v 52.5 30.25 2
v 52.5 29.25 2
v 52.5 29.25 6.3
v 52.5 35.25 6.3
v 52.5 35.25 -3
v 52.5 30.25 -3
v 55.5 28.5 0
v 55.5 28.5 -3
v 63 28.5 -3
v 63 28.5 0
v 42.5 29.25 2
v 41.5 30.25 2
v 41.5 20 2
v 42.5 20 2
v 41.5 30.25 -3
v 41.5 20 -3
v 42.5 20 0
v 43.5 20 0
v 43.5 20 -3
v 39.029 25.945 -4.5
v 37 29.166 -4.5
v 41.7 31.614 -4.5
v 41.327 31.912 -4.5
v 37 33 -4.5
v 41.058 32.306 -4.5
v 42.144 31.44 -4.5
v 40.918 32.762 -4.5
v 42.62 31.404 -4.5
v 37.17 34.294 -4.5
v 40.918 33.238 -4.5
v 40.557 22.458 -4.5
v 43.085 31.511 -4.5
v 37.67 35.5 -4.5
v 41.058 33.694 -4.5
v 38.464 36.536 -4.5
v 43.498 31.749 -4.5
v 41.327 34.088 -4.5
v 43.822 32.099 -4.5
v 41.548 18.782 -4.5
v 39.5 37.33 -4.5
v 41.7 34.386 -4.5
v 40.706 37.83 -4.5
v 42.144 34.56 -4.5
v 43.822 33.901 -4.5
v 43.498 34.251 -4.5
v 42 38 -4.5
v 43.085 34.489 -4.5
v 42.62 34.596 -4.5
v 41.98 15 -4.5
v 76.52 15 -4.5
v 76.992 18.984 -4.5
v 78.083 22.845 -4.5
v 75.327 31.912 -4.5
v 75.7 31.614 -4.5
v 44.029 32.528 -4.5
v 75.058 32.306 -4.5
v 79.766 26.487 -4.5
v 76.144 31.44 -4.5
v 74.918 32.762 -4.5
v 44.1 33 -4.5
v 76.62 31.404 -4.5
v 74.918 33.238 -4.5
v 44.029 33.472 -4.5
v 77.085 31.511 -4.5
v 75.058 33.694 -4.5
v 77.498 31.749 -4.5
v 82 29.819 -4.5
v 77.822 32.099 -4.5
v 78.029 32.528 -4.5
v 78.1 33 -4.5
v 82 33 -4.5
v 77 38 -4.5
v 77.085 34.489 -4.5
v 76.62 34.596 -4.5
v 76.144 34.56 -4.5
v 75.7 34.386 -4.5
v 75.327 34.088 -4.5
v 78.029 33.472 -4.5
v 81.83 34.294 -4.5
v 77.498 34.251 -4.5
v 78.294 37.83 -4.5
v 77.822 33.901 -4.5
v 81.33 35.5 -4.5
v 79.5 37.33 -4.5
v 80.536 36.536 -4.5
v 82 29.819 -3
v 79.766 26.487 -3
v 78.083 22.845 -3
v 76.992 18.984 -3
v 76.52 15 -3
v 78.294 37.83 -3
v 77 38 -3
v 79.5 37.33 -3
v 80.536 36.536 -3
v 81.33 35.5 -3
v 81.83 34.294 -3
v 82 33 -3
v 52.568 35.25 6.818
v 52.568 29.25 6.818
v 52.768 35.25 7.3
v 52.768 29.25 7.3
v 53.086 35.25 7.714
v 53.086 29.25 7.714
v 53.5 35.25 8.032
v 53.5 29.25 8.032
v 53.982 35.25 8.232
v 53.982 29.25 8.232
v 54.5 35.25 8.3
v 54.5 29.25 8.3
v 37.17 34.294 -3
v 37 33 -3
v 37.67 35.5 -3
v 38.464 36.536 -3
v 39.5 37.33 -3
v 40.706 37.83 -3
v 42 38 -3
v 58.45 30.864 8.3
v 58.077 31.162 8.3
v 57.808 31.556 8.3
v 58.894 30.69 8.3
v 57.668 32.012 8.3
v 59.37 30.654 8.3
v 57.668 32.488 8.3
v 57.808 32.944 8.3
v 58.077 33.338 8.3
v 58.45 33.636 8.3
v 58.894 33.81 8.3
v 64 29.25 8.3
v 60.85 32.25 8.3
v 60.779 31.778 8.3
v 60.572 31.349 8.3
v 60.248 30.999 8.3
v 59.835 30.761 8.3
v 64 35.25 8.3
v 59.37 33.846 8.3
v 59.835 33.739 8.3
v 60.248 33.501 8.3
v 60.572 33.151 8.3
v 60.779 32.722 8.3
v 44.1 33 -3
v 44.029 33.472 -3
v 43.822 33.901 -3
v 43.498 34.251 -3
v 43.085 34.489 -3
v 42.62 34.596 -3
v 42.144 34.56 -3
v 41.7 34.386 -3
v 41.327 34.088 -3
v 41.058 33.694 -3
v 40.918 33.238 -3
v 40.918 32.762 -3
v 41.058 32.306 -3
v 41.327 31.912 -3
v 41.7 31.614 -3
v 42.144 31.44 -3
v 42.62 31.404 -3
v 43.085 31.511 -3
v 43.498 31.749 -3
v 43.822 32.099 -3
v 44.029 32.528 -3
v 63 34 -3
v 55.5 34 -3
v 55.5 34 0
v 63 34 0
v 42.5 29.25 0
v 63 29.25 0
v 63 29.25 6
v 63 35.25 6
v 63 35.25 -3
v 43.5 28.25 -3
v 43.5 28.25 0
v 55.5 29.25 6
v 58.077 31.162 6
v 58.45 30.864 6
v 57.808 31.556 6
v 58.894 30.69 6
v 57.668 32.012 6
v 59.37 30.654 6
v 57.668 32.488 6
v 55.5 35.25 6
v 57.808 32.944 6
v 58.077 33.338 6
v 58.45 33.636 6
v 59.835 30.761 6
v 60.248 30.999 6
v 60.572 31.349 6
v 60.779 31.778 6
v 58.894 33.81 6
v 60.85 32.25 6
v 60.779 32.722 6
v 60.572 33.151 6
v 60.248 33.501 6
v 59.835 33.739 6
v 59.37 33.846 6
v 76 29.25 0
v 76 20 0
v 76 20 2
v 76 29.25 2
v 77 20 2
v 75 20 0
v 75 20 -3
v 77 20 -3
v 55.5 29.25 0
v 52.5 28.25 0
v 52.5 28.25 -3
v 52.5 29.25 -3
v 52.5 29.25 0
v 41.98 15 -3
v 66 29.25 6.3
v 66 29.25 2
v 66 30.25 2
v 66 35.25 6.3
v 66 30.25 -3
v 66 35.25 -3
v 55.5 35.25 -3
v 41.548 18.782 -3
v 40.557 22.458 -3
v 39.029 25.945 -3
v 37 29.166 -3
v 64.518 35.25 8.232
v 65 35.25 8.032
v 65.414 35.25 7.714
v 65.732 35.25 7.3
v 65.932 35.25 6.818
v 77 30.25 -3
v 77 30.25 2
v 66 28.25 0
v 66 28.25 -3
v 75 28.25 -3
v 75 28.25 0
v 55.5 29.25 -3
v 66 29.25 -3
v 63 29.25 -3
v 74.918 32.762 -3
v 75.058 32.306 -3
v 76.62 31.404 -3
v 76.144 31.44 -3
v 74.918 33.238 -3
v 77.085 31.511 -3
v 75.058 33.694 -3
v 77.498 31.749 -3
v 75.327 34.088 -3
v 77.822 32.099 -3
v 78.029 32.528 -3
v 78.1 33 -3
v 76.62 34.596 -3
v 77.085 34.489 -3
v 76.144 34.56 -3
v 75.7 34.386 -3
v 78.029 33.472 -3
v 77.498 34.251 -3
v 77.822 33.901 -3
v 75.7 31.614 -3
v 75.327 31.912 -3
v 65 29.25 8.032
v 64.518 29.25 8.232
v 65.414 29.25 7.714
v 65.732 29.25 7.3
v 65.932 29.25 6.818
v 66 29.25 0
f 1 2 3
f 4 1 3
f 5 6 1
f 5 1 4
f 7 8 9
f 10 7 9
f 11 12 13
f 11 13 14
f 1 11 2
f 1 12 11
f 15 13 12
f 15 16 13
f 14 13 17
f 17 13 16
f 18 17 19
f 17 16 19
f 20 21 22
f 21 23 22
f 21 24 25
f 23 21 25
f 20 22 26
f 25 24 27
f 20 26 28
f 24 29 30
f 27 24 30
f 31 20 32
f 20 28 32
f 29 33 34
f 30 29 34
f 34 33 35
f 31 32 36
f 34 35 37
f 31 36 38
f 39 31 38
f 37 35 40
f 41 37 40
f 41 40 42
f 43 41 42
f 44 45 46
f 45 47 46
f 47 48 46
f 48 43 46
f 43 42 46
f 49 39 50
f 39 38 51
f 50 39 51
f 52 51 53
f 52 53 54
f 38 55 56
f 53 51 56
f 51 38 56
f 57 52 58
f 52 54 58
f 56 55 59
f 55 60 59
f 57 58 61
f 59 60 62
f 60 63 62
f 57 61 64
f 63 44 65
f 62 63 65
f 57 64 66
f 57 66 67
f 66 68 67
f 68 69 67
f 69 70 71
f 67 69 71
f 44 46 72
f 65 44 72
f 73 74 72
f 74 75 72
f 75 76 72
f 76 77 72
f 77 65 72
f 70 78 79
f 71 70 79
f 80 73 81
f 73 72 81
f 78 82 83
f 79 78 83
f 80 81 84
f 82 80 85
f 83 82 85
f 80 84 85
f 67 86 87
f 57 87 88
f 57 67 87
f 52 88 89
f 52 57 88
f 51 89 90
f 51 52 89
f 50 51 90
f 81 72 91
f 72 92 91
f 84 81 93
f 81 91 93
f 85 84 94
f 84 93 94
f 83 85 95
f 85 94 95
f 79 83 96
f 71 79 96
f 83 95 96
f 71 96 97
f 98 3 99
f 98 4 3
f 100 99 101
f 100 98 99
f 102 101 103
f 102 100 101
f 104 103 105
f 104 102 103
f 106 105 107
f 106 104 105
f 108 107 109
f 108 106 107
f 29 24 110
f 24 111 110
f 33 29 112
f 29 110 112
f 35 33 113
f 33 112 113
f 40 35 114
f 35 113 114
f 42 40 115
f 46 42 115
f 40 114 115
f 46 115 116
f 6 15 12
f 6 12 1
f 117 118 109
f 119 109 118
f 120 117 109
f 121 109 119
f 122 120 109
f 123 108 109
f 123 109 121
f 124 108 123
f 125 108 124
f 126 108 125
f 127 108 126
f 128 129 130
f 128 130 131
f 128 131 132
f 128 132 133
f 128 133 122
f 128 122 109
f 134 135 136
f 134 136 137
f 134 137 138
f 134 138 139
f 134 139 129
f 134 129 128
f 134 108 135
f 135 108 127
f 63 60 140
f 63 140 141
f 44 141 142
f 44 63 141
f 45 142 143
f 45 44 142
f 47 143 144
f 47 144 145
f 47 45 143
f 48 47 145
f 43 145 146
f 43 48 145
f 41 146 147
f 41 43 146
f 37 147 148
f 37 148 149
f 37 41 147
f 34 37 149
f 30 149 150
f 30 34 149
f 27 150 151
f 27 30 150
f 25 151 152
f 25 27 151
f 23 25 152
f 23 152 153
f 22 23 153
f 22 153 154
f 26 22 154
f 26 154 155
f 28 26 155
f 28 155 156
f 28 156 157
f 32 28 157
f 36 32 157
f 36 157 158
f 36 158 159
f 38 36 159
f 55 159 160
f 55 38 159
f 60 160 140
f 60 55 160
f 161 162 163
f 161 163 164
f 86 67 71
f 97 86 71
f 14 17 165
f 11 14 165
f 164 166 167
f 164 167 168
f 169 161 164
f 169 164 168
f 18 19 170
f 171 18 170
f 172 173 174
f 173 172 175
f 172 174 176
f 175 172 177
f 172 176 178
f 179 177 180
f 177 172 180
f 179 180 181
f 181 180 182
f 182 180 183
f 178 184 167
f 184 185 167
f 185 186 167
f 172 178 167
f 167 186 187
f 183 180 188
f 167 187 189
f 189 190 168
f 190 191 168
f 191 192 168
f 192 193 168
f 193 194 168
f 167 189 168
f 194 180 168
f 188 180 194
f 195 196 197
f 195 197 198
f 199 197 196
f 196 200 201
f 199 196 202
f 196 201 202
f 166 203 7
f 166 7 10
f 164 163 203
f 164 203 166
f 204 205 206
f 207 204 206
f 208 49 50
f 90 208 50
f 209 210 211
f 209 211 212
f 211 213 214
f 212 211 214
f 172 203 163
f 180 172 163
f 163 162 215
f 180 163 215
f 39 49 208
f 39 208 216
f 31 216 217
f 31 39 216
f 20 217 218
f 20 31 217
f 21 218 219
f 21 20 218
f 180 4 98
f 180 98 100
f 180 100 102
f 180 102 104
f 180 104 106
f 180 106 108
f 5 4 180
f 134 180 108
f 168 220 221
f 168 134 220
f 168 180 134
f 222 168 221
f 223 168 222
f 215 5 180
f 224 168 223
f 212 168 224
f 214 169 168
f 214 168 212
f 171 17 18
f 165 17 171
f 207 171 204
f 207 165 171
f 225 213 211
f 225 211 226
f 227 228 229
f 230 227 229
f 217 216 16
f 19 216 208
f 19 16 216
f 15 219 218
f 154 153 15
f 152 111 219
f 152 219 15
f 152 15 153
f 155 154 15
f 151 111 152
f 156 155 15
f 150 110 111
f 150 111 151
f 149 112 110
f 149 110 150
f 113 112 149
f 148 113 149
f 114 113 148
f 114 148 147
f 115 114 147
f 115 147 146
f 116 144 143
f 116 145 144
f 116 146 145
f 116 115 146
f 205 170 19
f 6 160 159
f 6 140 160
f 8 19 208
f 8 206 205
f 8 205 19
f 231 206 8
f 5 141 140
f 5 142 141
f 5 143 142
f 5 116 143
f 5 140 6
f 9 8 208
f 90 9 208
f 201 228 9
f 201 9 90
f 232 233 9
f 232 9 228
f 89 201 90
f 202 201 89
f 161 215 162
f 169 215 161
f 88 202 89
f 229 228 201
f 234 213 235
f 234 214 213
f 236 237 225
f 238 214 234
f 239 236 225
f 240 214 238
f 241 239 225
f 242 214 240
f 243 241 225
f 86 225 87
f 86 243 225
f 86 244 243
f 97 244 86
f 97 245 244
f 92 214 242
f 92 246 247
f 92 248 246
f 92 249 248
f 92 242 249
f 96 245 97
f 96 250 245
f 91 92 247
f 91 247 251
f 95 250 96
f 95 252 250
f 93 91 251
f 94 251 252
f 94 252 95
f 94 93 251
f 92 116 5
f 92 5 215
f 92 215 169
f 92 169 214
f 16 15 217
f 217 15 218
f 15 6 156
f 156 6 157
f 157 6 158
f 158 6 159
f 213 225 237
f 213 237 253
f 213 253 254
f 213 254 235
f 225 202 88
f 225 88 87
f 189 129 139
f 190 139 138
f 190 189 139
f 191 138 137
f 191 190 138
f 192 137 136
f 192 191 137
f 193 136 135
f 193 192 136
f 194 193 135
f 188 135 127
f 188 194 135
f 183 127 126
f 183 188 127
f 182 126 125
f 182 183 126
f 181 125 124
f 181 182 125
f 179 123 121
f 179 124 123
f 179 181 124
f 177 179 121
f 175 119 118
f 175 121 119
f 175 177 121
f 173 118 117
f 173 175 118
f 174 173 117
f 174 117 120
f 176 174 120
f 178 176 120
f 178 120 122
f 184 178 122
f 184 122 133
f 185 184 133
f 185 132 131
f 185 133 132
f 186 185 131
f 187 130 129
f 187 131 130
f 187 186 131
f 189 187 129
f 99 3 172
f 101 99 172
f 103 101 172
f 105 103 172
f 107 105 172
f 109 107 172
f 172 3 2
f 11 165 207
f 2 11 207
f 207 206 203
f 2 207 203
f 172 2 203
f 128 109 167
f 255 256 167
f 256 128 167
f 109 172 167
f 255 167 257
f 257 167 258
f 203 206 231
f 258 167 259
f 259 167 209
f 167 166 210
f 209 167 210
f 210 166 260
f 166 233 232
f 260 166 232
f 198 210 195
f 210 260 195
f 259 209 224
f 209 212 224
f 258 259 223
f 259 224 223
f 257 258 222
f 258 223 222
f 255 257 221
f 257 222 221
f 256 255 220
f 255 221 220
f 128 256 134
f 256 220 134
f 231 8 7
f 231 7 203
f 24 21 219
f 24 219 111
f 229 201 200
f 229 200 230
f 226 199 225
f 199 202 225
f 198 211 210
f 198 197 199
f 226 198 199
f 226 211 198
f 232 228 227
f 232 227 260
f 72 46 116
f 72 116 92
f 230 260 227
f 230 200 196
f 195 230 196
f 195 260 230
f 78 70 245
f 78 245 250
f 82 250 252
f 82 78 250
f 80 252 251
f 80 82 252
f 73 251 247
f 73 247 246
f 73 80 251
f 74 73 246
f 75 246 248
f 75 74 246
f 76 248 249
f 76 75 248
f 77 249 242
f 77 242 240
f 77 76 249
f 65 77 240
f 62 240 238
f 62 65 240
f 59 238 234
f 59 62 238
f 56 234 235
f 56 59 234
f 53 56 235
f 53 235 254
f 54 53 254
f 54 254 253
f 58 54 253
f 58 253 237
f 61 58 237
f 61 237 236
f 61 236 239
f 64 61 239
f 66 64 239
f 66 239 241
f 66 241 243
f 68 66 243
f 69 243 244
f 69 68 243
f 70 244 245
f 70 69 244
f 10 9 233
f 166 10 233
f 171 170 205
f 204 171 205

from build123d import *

# Parameters (mm, degrees)
BOX148_W          = 3
BOX148_H          = 6
BOX148_DEPTH      = 9
BOX149_W          = 3
BOX149_H          = 6
BOX149_DEPTH      = 9
BOX151_W          = 2
BOX151_H          = 10.25
BOX151_DEPTH      = 3
BOX152_W          = 2
BOX152_H          = 10.25
BOX152_DEPTH      = 3
BOX153_W          = 1
BOX153_H          = 10.25
BOX153_DEPTH      = 2
BOX154_W          = 1
BOX154_H          = 10.25
BOX154_DEPTH      = 2
BOX155_W          = 7.5
BOX155_H          = 5.5
BOX155_DEPTH      = 3
BOX156_W          = 9
BOX156_H          = 2
BOX156_DEPTH      = 3
BOX157_W          = 9
BOX157_H          = 2
BOX157_DEPTH      = 3
BOX158_W          = 10
BOX158_H          = 1
BOX158_DEPTH      = 2
BOX159_W          = 10
BOX159_H          = 1
BOX159_DEPTH      = 2
CYLINDER066_R     = 1.6
CYLINDER066_DEPTH = 3
BOX150_W          = 13.5
BOX150_H          = 6
BOX150_DEPTH      = 2.3
FILLET035_R       = 2
CYLINDER065_R     = 1.6
CYLINDER065_DEPTH = 1.5
CYLINDER064_R     = 1.6
CYLINDER064_DEPTH = 1.5
CYLINDER063_R     = 25.5
CYLINDER063_DEPTH = 3
CYLINDER062_R     = 25.5
CYLINDER062_DEPTH = 3
BOX147_W          = 45
BOX147_H          = 23
BOX147_DEPTH      = 1.5
FILLET034_R       = 5


with BuildPart() as cube137:
    # Box148 → Box148 (new body)
    with BuildSketch(Plane(origin=(52.5, 29.25, -3), x_dir=(1, 0, 0), z_dir=(0, 0, 1))):
        with Locations((1.5, 3)):
            Rectangle(BOX148_W, BOX148_H)
    extrude(amount=BOX148_DEPTH)


with BuildPart() as cube138:
    # Box149 → Box149 (new body)
    with BuildSketch(Plane(origin=(63, 29.25, -3), x_dir=(1, 0, 0), z_dir=(0, 0, 1))):
        with Locations((1.5, 3)):
            Rectangle(BOX149_W, BOX149_H)
    extrude(amount=BOX149_DEPTH)


with BuildPart() as cube140:
    # Box151 → Box151 (new body)
    with BuildSketch(Plane(origin=(41.5, 20, -3), x_dir=(1, 0, 0), z_dir=(0, 0, 1))):
        with Locations((1, 5.125)):
            Rectangle(BOX151_W, BOX151_H)
    extrude(amount=BOX151_DEPTH)


with BuildPart() as cube141:
    # Box152 → Box152 (new body)
    with BuildSketch(Plane(origin=(75, 20, -3), x_dir=(1, 0, 0), z_dir=(0, 0, 1))):
        with Locations((1, 5.125)):
            Rectangle(BOX152_W, BOX152_H)
    extrude(amount=BOX152_DEPTH)


with BuildPart() as cube142:
    # Box153 → Box153 (new body)
    with BuildSketch(Plane(origin=(41.5, 20, 0), x_dir=(1, 0, 0), z_dir=(0, 0, 1))):
        with Locations((0.5, 5.125)):
            Rectangle(BOX153_W, BOX153_H)
    extrude(amount=BOX153_DEPTH)


with BuildPart() as cube143:
    # Box154 → Box154 (new body)
    with BuildSketch(Plane(origin=(76, 20, 0), x_dir=(1, 0, 0), z_dir=(0, 0, 1))):
        with Locations((0.5, 5.125)):
            Rectangle(BOX154_W, BOX154_H)
    extrude(amount=BOX154_DEPTH)


with BuildPart() as cube144:
    # Box155 → Box155 (new body)
    with BuildSketch(Plane(origin=(55.5, 28.5, -3), x_dir=(1, 0, 0), z_dir=(0, 0, 1))):
        with Locations((3.75, 2.75)):
            Rectangle(BOX155_W, BOX155_H)
    extrude(amount=BOX155_DEPTH)


with BuildPart() as cube145:
    # Box156 → Box156 (new body)
    with BuildSketch(Plane(origin=(43.5, 28.25, -3), x_dir=(1, 0, 0), z_dir=(0, 0, 1))):
        with Locations((4.5, 1)):
            Rectangle(BOX156_W, BOX156_H)
    extrude(amount=BOX156_DEPTH)


with BuildPart() as cube146:
    # Box157 → Box157 (new body)
    with BuildSketch(Plane(origin=(66, 28.25, -3), x_dir=(1, 0, 0), z_dir=(0, 0, 1))):
        with Locations((4.5, 1)):
            Rectangle(BOX157_W, BOX157_H)
    extrude(amount=BOX157_DEPTH)


with BuildPart() as cube147:
    # Box158 → Box158 (new body)
    with BuildSketch(Plane(origin=(66, 29.25, 0), x_dir=(1, 0, 0), z_dir=(0, 0, 1))):
        with Locations((5, 0.5)):
            Rectangle(BOX158_W, BOX158_H)
    extrude(amount=BOX158_DEPTH)


with BuildPart() as cube148:
    # Box159 → Box159 (new body)
    with BuildSketch(Plane(origin=(42.5, 29.25, 0), x_dir=(1, 0, 0), z_dir=(0, 0, 1))):
        with Locations((5, 0.5)):
            Rectangle(BOX159_W, BOX159_H)
    extrude(amount=BOX159_DEPTH)


with BuildPart() as cylinder147:
    # Cylinder066 → Cylinder066 (new body)
    with BuildSketch(Plane(origin=(59.25, 32.25, 6), x_dir=(1, 0, 0), z_dir=(0, 0, 1))):
        Circle(CYLINDER066_R)
    extrude(amount=CYLINDER066_DEPTH)


with BuildPart() as cut090:
    # Box150 → Box150 (new body)
    with BuildSketch(Plane(origin=(52.5, 29.25, 6), x_dir=(1, 0, 0), z_dir=(0, 0, 1))):
        with Locations((6.75, 3)):
            Rectangle(BOX150_W, BOX150_H)
    extrude(amount=BOX150_DEPTH)

    # Fillet035
    fillet035_edges = [cut090.edges().sort_by_distance(p)[0] for p in [
        (52.5, 32.25, 8.3),
        (66, 32.25, 8.3),
    ]]
    fillet(fillet035_edges, radius=FILLET035_R)

    # Cut090: cut Cylinder147
    add(cylinder147.part, mode=Mode.SUBTRACT)


with BuildPart() as cylinder146:
    # Cylinder065 → Cylinder065 (new body)
    with BuildSketch(Plane(origin=(76.5, 33, -4.5), x_dir=(1, 0, 0), z_dir=(0, 0, 1))):
        Circle(CYLINDER065_R)
    extrude(amount=CYLINDER065_DEPTH)


with BuildPart() as cylinder145:
    # Cylinder064 → Cylinder064 (new body)
    with BuildSketch(Plane(origin=(42.5, 33, -4.5), x_dir=(1, 0, 0), z_dir=(0, 0, 1))):
        Circle(CYLINDER064_R)
    extrude(amount=CYLINDER064_DEPTH)


with BuildPart() as cylinder144:
    # Cylinder063 → Cylinder063 (new body)
    with BuildSketch(Plane(origin=(102, 14, -6), x_dir=(1, 0, 0), z_dir=(0, 0, 1))):
        Circle(CYLINDER063_R)
    extrude(amount=CYLINDER063_DEPTH)


with BuildPart() as cylinder143:
    # Cylinder062 → Cylinder062 (new body)
    with BuildSketch(Plane(origin=(16.5, 14, -6), x_dir=(1, 0, 0), z_dir=(0, 0, 1))):
        Circle(CYLINDER062_R)
    extrude(amount=CYLINDER062_DEPTH)


with BuildPart() as fusion049:
    # Box147 → Box147 (new body)
    with BuildSketch(Plane(origin=(37, 15, -4.5), x_dir=(1, 0, 0), z_dir=(0, 0, 1))):
        with Locations((22.5, 11.5)):
            Rectangle(BOX147_W, BOX147_H)
    extrude(amount=BOX147_DEPTH)

    # Cut086: cut Cylinder143
    add(cylinder143.part, mode=Mode.SUBTRACT)

    # Cut087: cut Cylinder144
    add(cylinder144.part, mode=Mode.SUBTRACT)

    # Fillet034
    fillet034_edges = [fusion049.edges().sort_by_distance(p)[0] for p in [
        (82, 38, -3.75),
        (37, 38, -3.75),
    ]]
    fillet(fillet034_edges, radius=FILLET034_R)

    # Cut088: cut Cylinder145
    add(cylinder145.part, mode=Mode.SUBTRACT)

    # Cut089: cut Cylinder146
    add(cylinder146.part, mode=Mode.SUBTRACT)

    # Fusion049: union Cube137, Cube138, Cube140, Cube141, Cube142, Cube143, Cube144, Cube145, Cube146, Cube147, Cube148, Cut090
    add(cube137.part)
    add(cube138.part)
    add(cube140.part)
    add(cube141.part)
    add(cube142.part)
    add(cube143.part)
    add(cube144.part)
    add(cube145.part)
    add(cube146.part)
    add(cube147.part)
    add(cube148.part)
    add(cut090.part)


solid = fusion049.part
